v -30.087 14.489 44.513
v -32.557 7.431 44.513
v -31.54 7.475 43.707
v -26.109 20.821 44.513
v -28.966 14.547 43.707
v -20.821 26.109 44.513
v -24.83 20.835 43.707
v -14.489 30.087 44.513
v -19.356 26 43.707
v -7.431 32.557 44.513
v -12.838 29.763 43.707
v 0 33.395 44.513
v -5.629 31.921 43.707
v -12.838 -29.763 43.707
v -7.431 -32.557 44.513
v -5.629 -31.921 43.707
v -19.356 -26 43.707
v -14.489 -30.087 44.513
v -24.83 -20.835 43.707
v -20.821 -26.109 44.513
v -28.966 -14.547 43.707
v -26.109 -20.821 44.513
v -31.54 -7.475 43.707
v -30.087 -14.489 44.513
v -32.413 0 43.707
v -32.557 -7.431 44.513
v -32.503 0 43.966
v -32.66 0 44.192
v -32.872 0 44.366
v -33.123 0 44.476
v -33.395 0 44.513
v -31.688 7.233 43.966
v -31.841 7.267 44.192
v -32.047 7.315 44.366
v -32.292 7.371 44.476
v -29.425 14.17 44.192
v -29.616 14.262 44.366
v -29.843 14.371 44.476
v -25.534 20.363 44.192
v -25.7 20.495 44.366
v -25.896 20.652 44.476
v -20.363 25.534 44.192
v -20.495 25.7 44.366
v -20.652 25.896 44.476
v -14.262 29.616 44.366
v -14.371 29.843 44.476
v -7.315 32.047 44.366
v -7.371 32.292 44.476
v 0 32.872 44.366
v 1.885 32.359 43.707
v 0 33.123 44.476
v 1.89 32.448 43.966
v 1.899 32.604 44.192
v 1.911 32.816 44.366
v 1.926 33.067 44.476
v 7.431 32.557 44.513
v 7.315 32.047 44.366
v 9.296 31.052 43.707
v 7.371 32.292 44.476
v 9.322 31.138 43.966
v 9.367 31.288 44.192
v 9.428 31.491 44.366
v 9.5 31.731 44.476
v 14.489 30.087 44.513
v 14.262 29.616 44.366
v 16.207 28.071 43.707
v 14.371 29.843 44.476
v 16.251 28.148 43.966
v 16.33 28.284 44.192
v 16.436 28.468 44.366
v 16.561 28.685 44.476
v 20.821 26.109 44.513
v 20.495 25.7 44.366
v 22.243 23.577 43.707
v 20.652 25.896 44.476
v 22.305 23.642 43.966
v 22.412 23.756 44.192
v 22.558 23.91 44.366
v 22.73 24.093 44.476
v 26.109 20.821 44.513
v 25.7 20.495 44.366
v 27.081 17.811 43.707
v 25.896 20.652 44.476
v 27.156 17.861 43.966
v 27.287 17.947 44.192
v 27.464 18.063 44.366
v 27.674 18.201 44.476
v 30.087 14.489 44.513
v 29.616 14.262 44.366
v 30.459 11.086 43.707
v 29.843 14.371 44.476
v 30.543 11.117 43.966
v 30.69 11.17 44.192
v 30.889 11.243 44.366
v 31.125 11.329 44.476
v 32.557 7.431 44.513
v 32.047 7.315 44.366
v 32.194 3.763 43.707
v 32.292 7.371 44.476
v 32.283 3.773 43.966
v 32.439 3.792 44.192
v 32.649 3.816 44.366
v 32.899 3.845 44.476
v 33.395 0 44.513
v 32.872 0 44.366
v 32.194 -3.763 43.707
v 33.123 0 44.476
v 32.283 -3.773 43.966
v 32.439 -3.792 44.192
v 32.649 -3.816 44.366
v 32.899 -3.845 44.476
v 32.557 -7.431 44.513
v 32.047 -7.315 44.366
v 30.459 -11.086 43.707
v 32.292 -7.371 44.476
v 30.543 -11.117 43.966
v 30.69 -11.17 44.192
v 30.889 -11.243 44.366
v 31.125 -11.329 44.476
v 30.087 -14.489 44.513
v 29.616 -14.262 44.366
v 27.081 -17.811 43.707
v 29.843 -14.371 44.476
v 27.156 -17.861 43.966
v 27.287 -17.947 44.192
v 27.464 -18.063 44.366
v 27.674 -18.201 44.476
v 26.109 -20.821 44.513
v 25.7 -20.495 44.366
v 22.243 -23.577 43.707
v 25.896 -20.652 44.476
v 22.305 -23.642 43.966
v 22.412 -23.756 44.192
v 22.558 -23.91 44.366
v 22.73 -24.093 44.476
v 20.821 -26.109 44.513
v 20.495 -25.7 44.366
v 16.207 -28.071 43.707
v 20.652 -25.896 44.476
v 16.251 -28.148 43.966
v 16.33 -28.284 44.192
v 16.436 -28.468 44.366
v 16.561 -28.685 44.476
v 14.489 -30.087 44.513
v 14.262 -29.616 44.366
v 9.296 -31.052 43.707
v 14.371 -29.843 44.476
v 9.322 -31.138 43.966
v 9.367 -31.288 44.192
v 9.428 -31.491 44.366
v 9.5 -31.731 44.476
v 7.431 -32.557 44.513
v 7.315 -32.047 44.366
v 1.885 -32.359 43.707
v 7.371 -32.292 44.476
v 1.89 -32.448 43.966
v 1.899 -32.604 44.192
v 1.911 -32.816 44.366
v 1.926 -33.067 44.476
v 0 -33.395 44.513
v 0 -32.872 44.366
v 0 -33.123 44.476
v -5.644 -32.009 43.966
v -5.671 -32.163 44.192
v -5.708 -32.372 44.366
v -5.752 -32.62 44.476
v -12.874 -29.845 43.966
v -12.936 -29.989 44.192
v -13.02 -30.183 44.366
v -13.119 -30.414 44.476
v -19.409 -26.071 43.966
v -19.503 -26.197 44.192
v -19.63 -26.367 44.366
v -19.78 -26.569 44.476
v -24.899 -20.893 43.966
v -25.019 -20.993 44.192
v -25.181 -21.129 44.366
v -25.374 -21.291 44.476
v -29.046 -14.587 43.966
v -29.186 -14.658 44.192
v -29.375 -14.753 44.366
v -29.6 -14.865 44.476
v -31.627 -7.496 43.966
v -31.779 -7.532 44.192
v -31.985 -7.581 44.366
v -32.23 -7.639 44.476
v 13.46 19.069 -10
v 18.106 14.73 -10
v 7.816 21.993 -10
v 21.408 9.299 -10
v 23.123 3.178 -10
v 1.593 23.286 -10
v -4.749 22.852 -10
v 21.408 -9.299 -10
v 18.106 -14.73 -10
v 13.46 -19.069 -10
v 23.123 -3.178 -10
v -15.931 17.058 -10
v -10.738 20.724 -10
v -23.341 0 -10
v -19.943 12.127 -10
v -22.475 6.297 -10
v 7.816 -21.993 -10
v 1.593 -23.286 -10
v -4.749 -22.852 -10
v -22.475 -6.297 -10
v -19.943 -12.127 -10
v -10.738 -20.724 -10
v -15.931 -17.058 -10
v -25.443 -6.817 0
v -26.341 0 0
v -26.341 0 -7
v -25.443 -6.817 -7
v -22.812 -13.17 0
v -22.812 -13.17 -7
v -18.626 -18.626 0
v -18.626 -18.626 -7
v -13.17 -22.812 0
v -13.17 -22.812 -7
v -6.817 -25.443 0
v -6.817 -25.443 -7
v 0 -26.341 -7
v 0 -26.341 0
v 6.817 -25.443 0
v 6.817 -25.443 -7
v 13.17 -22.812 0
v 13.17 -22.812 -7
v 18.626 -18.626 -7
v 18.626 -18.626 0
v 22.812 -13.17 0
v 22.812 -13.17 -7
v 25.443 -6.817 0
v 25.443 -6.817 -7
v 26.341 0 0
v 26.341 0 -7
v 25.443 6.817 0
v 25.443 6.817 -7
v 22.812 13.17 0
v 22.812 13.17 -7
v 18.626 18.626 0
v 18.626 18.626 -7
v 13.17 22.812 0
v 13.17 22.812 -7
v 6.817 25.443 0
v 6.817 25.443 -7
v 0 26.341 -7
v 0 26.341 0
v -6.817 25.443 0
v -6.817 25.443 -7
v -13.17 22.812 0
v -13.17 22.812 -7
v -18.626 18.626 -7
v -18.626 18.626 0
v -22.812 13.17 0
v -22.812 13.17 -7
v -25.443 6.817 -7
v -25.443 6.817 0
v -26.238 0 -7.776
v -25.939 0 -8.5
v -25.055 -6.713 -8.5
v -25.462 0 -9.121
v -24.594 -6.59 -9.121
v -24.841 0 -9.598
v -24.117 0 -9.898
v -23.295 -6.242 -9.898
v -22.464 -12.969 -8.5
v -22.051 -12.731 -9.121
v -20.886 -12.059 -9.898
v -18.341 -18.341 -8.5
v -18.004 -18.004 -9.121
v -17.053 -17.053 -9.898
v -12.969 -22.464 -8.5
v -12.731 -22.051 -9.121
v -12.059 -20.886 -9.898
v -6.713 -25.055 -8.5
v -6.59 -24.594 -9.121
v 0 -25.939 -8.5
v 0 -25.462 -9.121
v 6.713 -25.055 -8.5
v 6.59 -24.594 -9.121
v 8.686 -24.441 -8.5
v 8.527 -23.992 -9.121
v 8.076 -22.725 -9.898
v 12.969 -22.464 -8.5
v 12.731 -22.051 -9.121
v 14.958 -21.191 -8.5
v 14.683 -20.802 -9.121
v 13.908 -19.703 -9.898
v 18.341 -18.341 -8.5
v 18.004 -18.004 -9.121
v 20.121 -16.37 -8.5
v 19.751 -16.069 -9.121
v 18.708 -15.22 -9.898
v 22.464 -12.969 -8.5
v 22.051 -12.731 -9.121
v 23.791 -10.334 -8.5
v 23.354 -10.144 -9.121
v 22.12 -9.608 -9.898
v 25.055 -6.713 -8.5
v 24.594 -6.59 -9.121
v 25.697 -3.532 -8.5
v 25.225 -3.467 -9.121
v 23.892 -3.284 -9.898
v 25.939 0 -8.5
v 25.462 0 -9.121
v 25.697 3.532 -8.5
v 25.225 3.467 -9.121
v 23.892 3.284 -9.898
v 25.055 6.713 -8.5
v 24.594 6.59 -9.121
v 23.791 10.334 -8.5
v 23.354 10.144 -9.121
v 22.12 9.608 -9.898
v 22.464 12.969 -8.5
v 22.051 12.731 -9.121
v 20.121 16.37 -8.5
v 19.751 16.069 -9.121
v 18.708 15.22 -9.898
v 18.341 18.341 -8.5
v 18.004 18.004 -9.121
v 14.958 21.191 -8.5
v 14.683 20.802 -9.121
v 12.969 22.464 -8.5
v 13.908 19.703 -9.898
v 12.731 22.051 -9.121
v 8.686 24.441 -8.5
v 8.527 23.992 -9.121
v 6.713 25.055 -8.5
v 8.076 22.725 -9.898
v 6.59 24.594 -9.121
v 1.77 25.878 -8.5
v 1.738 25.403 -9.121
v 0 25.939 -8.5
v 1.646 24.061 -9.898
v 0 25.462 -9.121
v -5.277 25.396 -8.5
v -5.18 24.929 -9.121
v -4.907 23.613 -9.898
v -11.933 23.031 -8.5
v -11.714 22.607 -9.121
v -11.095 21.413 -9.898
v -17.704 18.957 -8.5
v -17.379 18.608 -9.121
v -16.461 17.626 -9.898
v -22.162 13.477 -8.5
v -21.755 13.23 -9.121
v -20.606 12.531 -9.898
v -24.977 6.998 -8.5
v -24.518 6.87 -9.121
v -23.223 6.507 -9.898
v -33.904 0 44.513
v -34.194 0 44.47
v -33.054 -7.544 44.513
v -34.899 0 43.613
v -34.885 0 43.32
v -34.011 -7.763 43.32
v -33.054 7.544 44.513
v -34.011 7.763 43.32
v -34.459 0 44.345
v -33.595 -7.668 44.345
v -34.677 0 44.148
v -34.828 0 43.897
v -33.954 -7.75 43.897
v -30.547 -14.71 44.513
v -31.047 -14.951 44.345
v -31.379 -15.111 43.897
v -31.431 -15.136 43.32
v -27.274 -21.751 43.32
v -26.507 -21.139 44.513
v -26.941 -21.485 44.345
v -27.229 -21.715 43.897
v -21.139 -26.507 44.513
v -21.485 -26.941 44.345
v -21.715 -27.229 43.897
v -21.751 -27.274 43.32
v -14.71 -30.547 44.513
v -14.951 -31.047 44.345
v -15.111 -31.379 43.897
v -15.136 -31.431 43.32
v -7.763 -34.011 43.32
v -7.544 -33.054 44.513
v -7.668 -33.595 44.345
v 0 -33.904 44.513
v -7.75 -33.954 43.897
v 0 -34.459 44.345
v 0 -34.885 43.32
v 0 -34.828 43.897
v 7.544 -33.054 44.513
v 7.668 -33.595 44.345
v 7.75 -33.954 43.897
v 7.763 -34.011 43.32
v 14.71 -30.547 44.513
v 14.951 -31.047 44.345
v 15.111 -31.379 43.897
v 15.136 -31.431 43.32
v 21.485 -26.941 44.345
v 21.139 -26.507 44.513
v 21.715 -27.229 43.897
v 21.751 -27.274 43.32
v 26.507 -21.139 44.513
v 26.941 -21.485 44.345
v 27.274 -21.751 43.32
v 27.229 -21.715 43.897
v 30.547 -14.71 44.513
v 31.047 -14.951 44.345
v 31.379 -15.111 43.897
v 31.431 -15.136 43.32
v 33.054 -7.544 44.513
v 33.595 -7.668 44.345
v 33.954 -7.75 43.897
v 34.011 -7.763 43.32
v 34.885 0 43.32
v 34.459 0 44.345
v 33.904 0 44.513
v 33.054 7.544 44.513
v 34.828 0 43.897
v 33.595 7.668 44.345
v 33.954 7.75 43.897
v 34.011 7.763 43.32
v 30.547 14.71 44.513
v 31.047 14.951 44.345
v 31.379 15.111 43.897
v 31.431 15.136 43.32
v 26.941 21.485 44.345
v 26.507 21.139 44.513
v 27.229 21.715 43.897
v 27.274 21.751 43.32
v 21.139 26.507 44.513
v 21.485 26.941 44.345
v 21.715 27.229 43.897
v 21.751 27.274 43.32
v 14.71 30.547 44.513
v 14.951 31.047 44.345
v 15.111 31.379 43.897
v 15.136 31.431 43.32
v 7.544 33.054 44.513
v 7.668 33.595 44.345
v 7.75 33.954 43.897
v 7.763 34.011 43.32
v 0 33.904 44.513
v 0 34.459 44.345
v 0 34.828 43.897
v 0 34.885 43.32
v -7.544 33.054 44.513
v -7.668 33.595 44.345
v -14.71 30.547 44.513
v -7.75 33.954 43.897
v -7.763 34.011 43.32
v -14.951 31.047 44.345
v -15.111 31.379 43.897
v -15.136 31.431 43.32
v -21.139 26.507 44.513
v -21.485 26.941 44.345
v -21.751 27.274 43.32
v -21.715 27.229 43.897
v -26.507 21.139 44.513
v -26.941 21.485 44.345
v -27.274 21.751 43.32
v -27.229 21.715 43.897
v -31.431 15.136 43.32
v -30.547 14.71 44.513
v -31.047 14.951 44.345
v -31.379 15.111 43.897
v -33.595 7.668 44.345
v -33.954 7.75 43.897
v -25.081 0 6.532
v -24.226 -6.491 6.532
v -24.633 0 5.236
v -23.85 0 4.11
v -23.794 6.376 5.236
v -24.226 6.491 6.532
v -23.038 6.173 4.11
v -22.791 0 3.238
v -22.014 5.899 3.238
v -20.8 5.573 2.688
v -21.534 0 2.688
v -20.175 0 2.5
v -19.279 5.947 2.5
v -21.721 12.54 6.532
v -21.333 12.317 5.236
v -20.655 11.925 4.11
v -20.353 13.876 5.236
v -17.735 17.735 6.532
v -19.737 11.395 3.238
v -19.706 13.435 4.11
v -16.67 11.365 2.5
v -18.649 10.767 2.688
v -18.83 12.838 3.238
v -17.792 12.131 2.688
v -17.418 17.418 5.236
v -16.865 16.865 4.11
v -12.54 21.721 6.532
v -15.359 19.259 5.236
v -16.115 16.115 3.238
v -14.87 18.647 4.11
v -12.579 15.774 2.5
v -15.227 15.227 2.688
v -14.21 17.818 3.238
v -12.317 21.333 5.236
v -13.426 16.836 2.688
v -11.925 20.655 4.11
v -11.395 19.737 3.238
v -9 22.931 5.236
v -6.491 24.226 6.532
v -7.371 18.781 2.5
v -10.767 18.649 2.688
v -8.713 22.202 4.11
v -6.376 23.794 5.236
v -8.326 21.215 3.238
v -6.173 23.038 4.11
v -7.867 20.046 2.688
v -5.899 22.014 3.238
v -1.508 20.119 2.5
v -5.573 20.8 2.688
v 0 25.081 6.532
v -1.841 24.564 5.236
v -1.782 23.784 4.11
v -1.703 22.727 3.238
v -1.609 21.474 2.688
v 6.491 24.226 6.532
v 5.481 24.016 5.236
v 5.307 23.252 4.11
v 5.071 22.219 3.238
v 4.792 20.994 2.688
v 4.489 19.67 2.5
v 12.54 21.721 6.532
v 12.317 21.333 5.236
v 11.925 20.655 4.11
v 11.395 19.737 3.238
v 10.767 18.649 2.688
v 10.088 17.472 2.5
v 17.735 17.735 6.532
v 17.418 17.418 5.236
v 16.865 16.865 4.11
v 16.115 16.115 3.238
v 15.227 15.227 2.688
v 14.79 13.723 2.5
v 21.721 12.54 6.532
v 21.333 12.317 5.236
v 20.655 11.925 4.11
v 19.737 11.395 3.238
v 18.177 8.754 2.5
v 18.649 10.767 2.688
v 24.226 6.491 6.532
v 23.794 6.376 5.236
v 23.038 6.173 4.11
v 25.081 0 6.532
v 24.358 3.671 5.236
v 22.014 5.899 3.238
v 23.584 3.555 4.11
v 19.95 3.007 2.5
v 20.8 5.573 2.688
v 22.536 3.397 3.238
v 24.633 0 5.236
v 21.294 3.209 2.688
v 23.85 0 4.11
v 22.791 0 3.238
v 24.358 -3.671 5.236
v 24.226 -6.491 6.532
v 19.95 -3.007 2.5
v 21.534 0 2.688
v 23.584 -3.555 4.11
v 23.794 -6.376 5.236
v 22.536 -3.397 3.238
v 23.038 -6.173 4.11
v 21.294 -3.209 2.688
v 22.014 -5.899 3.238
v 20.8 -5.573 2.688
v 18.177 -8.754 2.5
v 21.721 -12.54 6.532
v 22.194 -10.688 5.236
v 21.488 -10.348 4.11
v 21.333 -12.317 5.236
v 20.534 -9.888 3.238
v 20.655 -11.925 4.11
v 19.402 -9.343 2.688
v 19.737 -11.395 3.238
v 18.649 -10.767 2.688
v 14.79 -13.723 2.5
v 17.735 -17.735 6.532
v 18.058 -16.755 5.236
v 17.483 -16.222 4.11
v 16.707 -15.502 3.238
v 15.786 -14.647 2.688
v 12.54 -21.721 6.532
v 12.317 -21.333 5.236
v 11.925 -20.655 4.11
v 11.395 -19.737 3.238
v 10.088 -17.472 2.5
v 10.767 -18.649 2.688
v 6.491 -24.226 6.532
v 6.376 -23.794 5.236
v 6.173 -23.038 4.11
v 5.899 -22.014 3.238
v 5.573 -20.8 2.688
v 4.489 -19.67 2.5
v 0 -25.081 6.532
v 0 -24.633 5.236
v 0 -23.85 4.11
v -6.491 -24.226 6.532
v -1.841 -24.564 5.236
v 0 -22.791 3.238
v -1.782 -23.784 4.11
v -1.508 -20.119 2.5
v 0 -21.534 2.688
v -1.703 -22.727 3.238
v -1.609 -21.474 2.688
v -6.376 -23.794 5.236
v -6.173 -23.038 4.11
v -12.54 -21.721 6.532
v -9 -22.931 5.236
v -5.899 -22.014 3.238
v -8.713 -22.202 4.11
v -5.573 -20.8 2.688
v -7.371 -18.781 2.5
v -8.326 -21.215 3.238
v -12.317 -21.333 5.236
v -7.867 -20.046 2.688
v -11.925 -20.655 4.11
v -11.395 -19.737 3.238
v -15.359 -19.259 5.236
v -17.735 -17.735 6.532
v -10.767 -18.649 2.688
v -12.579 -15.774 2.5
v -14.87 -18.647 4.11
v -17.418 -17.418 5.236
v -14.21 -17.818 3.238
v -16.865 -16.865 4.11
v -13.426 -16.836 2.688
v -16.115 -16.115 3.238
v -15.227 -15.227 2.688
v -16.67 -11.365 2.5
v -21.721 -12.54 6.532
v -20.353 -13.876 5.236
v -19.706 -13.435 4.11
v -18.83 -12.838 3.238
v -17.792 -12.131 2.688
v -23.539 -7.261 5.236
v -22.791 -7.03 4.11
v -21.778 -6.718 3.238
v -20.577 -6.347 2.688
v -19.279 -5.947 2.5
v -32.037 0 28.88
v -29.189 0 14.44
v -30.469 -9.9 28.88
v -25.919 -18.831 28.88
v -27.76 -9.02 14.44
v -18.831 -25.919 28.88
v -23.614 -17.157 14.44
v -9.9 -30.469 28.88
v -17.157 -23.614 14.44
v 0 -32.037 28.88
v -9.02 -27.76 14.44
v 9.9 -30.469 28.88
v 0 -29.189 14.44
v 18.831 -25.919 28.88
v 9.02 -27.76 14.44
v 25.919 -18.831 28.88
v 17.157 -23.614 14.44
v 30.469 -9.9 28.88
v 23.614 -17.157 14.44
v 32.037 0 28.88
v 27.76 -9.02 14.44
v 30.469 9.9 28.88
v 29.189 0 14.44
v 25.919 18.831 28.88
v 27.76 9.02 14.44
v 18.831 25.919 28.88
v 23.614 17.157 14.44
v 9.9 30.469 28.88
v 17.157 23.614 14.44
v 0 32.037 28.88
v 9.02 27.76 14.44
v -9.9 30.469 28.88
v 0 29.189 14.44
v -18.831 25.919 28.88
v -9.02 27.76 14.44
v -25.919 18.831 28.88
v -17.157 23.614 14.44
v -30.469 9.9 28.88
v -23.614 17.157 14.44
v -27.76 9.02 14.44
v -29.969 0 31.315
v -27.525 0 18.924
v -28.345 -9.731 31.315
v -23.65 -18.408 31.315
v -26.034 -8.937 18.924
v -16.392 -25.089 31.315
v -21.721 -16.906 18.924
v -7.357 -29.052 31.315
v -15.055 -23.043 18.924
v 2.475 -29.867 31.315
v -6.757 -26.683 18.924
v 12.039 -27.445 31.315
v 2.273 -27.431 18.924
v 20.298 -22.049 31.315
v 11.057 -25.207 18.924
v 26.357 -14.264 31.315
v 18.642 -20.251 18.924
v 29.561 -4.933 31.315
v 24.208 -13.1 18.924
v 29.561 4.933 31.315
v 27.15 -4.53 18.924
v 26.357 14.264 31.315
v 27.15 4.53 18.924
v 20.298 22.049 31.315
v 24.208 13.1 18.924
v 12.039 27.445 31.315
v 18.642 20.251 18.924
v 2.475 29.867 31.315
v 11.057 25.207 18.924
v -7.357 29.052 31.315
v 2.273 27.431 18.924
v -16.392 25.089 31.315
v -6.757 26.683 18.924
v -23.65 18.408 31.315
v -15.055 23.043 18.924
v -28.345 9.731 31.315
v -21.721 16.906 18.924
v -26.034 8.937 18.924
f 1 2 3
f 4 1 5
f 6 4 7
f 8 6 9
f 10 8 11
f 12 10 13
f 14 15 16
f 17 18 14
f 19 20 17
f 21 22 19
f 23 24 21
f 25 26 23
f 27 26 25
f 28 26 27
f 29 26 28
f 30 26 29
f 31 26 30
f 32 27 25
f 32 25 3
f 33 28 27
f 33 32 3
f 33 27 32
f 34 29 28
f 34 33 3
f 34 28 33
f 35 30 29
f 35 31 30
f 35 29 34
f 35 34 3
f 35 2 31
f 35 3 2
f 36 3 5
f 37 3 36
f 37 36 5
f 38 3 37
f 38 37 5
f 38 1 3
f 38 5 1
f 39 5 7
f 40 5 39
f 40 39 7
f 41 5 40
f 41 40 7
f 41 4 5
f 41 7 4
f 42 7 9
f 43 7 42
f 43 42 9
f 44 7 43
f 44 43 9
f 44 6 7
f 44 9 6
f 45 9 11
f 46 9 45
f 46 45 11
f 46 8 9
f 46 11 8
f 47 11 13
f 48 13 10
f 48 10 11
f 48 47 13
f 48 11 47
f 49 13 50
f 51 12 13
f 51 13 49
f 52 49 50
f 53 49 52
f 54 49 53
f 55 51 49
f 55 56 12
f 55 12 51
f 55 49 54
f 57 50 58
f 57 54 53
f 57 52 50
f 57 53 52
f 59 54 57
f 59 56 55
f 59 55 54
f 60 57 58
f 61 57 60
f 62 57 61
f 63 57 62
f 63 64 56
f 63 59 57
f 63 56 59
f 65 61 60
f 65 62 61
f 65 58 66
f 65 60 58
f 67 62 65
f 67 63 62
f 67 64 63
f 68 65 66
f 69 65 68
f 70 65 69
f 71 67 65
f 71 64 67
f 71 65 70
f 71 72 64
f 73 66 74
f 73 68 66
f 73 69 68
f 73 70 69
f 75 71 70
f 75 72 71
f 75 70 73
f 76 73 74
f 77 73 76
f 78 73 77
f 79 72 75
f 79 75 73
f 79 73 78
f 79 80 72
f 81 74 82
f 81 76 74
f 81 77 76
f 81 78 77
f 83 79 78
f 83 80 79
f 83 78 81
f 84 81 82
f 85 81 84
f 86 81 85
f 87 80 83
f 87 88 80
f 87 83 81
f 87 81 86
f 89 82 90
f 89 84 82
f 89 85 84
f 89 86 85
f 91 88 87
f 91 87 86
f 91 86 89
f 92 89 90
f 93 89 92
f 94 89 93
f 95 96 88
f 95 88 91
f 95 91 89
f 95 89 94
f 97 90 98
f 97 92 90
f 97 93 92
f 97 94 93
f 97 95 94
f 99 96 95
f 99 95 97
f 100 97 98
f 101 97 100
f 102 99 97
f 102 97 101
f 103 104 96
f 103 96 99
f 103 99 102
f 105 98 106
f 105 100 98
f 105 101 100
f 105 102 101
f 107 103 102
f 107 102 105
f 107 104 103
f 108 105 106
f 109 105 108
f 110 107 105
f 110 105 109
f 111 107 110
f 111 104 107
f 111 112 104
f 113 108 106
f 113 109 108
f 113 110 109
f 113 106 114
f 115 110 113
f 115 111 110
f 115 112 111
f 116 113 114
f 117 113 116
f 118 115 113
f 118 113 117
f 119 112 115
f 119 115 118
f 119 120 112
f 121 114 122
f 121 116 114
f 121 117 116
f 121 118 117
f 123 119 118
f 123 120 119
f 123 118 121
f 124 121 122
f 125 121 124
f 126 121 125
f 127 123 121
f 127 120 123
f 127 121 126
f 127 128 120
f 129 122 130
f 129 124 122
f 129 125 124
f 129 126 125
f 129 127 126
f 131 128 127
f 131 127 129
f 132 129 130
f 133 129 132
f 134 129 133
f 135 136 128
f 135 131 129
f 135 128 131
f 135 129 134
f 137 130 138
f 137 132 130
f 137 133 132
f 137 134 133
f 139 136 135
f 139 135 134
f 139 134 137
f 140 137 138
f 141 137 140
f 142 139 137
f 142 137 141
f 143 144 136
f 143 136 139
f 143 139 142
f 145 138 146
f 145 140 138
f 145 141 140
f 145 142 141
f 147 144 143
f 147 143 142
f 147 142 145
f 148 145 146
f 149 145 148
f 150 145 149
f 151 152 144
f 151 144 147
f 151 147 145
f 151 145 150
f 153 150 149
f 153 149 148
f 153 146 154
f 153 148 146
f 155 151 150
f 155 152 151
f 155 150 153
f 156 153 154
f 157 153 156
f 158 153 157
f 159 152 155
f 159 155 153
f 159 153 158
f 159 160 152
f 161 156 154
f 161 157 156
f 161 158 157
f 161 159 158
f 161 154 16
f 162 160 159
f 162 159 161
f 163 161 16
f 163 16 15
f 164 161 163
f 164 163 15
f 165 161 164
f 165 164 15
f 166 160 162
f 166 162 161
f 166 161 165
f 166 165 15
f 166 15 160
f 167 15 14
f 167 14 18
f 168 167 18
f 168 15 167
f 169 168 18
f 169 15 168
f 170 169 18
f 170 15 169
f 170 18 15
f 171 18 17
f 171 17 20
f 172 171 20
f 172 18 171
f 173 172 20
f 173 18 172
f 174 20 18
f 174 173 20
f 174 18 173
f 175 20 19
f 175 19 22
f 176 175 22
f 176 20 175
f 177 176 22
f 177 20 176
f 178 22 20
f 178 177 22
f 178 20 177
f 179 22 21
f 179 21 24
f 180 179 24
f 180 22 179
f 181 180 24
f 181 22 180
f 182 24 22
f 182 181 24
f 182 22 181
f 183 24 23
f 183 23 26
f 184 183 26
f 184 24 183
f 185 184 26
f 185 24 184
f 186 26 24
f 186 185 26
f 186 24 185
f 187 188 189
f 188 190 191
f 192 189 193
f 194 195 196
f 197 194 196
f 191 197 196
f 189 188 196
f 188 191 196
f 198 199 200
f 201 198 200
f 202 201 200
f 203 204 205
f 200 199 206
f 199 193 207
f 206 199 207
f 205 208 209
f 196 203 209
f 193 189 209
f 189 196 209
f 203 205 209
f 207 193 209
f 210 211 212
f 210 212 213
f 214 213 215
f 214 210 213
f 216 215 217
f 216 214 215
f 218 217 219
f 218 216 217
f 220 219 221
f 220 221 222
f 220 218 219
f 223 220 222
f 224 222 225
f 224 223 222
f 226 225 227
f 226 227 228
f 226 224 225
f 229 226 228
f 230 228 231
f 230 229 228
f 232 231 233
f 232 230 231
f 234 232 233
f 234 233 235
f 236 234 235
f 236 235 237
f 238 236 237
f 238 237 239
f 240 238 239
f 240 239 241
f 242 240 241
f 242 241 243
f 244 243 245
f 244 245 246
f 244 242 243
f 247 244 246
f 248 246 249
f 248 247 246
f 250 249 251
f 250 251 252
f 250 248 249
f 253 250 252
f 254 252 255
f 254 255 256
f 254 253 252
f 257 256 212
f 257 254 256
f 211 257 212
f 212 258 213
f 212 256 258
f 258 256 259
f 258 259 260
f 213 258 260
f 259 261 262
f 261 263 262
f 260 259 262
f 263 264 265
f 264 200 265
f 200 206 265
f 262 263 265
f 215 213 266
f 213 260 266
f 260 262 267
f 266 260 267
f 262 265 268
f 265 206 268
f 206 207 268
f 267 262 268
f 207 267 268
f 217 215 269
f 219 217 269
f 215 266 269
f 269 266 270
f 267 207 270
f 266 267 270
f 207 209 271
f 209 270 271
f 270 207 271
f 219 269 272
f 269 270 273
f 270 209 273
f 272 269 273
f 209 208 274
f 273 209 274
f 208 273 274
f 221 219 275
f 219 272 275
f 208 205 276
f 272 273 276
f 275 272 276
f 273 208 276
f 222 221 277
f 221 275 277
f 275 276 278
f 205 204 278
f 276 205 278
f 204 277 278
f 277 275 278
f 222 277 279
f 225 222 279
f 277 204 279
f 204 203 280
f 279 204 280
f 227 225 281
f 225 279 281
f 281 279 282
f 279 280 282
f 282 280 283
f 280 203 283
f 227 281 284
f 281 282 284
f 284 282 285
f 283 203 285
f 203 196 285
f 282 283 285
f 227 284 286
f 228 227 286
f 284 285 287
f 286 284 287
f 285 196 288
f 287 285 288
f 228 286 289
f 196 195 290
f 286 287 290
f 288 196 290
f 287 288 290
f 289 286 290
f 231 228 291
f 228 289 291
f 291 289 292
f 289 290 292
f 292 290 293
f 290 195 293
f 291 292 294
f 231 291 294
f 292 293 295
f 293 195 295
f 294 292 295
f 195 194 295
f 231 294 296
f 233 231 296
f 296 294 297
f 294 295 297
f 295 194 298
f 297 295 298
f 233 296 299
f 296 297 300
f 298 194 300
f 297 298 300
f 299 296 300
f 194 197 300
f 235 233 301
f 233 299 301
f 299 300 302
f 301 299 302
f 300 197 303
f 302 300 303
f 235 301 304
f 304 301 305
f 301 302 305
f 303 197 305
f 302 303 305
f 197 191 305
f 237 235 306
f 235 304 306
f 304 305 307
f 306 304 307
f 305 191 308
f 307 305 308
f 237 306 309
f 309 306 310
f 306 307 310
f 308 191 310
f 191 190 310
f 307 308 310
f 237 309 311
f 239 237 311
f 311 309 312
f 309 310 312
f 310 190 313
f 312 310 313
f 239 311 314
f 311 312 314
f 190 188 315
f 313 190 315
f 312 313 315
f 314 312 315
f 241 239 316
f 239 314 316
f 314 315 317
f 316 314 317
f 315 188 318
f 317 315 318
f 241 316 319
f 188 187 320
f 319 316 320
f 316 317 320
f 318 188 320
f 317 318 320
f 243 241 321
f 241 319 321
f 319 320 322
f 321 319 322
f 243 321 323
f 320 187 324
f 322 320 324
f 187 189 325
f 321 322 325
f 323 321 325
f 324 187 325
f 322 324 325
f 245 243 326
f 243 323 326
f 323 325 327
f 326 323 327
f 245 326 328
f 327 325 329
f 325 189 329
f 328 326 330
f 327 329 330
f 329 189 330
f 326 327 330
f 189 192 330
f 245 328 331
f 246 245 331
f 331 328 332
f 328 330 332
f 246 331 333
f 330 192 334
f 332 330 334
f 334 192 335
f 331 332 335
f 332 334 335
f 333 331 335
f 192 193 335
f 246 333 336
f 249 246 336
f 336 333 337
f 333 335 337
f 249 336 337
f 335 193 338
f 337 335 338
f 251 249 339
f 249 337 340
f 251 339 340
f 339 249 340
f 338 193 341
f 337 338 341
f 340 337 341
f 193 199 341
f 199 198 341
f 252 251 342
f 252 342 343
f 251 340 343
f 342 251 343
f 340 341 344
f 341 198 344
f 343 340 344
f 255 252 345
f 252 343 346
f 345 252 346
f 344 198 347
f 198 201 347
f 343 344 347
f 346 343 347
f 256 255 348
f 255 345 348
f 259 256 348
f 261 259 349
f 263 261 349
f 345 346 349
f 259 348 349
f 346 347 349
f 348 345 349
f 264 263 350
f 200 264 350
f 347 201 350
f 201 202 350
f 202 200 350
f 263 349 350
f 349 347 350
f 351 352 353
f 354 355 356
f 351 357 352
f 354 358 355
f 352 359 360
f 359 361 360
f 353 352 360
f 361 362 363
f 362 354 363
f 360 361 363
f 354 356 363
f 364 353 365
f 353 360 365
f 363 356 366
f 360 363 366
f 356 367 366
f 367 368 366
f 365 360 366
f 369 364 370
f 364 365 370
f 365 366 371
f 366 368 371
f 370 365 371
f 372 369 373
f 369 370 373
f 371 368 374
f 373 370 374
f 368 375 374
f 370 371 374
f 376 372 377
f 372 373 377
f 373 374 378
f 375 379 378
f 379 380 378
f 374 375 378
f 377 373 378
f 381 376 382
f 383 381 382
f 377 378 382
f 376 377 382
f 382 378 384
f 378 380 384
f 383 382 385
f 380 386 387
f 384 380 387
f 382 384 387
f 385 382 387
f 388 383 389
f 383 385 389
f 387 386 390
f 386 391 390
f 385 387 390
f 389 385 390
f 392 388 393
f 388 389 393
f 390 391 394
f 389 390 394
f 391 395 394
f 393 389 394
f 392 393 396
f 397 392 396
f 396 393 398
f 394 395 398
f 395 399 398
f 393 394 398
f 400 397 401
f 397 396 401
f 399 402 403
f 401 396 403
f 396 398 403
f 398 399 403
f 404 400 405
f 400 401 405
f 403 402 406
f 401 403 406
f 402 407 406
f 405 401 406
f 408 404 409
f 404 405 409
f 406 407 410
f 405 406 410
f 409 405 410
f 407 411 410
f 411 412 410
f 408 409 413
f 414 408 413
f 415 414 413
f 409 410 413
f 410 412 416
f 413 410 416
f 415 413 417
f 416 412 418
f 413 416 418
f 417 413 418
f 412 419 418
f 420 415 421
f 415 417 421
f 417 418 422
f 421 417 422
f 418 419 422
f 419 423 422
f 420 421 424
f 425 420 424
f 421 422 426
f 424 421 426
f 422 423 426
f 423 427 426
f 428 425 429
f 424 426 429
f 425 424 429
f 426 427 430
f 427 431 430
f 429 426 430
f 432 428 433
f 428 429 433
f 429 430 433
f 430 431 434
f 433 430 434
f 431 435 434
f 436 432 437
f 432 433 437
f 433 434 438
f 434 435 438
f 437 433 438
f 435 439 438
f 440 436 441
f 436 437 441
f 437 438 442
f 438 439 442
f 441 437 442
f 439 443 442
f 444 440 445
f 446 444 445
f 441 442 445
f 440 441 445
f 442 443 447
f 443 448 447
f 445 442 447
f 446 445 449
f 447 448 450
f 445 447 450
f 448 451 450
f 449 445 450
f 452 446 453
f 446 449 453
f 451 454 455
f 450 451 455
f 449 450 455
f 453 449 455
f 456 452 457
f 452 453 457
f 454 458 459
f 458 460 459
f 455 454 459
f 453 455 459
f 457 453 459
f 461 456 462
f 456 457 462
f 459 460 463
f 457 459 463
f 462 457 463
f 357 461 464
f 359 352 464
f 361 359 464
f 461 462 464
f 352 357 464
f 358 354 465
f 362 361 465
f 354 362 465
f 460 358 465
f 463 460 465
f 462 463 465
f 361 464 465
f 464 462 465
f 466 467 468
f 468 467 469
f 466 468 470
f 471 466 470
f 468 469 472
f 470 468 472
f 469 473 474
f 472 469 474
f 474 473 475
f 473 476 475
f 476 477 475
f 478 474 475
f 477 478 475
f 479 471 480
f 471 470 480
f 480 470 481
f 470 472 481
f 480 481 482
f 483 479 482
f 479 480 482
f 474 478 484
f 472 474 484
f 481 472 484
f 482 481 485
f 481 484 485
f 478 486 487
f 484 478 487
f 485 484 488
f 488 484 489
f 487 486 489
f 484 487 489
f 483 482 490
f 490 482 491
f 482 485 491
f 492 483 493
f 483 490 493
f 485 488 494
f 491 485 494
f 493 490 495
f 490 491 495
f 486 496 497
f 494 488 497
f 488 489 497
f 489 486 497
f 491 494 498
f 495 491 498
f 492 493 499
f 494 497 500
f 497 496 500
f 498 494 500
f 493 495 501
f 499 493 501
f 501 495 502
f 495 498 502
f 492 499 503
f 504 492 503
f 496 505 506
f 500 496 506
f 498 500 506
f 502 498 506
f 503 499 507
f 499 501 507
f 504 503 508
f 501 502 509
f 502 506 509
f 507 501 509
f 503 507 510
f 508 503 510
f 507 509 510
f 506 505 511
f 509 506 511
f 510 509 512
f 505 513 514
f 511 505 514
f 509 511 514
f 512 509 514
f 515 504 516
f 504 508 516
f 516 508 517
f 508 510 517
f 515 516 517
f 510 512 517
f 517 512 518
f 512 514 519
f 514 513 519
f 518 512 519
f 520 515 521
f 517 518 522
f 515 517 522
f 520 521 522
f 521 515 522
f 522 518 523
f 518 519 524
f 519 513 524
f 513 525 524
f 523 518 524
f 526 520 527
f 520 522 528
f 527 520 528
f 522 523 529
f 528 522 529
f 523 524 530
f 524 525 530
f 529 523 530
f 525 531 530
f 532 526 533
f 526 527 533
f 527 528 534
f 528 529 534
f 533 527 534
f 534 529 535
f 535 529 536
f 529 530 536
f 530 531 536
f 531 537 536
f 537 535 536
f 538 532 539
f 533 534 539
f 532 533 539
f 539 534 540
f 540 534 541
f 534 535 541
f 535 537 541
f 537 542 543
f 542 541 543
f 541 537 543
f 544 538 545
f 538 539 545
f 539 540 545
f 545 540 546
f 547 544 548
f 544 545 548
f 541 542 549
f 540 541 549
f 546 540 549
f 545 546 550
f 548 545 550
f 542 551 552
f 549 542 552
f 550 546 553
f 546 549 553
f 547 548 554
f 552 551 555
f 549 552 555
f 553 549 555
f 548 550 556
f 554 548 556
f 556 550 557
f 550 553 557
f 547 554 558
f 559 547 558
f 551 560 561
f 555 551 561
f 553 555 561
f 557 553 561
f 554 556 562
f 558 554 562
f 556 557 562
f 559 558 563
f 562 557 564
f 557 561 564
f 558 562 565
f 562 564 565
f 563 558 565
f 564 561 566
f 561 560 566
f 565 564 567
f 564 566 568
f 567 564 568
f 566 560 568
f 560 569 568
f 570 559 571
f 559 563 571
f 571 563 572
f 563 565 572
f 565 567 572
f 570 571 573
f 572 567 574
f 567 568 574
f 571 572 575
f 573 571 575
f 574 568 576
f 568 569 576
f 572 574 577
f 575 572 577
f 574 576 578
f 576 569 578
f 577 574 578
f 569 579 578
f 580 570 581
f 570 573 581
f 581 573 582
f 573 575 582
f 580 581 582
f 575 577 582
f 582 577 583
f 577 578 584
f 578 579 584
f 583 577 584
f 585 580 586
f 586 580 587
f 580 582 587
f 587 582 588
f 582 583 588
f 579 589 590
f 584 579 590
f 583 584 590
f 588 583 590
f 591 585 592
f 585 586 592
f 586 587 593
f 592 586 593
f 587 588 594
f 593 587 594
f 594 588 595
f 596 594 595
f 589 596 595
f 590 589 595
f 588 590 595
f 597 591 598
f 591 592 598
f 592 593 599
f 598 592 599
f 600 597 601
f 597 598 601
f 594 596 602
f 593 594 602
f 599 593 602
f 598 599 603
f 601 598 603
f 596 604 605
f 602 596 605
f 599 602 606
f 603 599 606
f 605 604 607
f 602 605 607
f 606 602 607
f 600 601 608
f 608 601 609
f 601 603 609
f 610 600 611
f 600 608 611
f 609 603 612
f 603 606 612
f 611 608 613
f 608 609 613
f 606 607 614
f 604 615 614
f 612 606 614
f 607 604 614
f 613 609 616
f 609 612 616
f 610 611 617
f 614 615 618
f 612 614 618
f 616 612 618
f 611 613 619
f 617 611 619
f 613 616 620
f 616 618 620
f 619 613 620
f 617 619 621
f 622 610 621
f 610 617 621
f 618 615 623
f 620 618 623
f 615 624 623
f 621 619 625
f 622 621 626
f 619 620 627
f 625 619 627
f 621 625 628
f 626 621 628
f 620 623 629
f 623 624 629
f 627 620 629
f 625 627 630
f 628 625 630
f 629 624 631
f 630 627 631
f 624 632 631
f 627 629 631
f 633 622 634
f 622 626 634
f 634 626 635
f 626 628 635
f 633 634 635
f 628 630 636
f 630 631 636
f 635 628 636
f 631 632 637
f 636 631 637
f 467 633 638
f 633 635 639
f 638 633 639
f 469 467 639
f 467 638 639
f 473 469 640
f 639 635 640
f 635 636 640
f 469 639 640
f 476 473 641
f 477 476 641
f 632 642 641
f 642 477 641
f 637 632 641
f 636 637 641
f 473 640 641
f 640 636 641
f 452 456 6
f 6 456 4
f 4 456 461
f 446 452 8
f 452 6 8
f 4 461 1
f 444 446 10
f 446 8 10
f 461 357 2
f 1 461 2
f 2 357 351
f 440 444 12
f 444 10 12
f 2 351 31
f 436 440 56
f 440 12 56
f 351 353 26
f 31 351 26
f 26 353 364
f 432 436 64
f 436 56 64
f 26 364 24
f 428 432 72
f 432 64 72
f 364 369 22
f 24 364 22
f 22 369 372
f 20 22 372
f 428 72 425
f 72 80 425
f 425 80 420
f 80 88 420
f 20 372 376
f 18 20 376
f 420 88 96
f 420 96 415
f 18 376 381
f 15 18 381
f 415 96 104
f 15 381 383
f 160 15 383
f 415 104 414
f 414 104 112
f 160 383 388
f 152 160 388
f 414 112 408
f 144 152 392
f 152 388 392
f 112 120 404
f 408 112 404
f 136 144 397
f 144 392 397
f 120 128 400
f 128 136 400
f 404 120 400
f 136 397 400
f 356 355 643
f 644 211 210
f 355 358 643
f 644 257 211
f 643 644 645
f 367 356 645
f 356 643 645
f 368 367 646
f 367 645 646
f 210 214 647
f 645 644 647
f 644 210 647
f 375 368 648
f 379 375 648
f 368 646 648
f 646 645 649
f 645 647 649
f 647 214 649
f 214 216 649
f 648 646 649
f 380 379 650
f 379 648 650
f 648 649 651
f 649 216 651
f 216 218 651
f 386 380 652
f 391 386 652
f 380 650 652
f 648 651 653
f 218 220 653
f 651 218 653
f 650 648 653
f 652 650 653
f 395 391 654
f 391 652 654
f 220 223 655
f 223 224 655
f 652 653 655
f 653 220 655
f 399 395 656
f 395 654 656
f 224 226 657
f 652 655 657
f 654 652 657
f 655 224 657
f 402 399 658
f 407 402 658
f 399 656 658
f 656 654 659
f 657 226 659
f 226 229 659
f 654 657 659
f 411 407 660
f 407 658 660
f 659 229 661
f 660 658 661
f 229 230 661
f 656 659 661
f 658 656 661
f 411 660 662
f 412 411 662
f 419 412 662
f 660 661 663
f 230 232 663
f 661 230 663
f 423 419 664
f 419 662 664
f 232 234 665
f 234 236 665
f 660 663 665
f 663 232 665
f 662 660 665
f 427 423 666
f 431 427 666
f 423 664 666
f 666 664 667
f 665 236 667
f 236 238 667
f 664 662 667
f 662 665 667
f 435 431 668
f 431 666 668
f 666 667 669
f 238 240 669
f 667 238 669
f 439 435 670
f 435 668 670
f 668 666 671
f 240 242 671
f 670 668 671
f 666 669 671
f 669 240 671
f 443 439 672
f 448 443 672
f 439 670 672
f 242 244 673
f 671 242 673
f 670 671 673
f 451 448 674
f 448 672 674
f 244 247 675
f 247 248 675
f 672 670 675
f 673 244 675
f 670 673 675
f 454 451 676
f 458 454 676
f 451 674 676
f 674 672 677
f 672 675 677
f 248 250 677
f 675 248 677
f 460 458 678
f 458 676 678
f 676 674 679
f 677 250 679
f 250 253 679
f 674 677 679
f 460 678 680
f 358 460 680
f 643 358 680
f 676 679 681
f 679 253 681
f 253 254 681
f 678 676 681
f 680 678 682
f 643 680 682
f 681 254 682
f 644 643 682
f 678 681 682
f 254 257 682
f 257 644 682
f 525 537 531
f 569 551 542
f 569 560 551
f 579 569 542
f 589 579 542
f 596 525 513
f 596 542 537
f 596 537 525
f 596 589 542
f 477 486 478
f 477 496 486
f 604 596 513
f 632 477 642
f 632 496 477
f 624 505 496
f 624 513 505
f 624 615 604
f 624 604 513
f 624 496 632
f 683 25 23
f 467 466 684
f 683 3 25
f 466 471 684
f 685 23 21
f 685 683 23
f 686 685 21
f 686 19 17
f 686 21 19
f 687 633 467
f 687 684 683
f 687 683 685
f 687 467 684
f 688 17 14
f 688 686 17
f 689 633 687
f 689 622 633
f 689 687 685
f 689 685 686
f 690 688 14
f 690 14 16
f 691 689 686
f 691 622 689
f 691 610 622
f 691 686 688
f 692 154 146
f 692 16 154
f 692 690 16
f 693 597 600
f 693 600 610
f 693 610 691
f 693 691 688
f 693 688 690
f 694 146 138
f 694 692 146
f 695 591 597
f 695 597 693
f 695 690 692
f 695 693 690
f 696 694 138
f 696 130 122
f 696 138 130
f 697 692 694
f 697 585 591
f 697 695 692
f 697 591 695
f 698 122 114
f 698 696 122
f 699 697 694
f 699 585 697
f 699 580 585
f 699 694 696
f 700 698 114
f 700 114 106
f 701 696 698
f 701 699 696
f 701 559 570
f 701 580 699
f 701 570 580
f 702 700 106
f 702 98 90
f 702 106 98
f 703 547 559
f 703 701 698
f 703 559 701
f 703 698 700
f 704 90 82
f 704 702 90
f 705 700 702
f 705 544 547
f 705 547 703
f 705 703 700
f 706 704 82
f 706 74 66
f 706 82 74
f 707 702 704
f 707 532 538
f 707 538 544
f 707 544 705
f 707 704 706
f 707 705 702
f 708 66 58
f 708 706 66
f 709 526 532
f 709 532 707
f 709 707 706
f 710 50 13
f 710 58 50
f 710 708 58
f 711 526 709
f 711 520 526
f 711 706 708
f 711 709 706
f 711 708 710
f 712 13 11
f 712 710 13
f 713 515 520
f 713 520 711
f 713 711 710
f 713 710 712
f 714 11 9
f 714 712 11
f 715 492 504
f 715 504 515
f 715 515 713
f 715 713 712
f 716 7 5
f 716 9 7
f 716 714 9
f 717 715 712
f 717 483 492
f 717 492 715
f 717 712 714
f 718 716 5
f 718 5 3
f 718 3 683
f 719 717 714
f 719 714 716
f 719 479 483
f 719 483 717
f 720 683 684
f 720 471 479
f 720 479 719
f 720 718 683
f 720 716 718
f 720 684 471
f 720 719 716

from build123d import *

# Parameters (mm, degrees)
F2_T     = -2.5
F3_DEPTH = 10
F4_R     = 5
F5_R     = 1
F6_R     = 3


with BuildPart() as f1:
    # F0 (on Front) → F1 (revolve)
    with BuildSketch(Plane.XZ):
        Polygon((0, 44.5134416223), (-35.1207107306, 44.5134416223), (-26.3405442238, 0), (0, 0), align=None)
    revolve(axis=Axis((0, 0, 22.2567208111), (0, 0, 1)))

    # F2
    f2_openings = [f1.faces().sort_by_distance(p)[0] for p in [
        (0, 0, 44.513442),
    ]]
    offset(amount=F2_T, openings=f2_openings)

    # F3 (add): a face of the model
    f3_faces = [f1.faces().sort_by_distance(p)[0] for p in [
        (0, 0, 0),
    ]]
    extrude(f3_faces, amount=F3_DEPTH)

    # F4
    f4_edges = [f1.edges().sort_by_distance(p)[0] for p in [
        (24.285494, 0, 2.5),
    ]]
    fillet(f4_edges, radius=F4_R)

    # F5
    f5_edges = [f1.edges().sort_by_distance(p)[0] for p in [
        (32.572542, 0, 44.513442),
        (35.120711, 0, 44.513442),
    ]]
    fillet(f5_edges, radius=F5_R)

    # F6
    f6_edges = [f1.edges().sort_by_distance(p)[0] for p in [
        (26.340544, 0, -10),
    ]]
    fillet(f6_edges, radius=F6_R)


solid = f1.part
